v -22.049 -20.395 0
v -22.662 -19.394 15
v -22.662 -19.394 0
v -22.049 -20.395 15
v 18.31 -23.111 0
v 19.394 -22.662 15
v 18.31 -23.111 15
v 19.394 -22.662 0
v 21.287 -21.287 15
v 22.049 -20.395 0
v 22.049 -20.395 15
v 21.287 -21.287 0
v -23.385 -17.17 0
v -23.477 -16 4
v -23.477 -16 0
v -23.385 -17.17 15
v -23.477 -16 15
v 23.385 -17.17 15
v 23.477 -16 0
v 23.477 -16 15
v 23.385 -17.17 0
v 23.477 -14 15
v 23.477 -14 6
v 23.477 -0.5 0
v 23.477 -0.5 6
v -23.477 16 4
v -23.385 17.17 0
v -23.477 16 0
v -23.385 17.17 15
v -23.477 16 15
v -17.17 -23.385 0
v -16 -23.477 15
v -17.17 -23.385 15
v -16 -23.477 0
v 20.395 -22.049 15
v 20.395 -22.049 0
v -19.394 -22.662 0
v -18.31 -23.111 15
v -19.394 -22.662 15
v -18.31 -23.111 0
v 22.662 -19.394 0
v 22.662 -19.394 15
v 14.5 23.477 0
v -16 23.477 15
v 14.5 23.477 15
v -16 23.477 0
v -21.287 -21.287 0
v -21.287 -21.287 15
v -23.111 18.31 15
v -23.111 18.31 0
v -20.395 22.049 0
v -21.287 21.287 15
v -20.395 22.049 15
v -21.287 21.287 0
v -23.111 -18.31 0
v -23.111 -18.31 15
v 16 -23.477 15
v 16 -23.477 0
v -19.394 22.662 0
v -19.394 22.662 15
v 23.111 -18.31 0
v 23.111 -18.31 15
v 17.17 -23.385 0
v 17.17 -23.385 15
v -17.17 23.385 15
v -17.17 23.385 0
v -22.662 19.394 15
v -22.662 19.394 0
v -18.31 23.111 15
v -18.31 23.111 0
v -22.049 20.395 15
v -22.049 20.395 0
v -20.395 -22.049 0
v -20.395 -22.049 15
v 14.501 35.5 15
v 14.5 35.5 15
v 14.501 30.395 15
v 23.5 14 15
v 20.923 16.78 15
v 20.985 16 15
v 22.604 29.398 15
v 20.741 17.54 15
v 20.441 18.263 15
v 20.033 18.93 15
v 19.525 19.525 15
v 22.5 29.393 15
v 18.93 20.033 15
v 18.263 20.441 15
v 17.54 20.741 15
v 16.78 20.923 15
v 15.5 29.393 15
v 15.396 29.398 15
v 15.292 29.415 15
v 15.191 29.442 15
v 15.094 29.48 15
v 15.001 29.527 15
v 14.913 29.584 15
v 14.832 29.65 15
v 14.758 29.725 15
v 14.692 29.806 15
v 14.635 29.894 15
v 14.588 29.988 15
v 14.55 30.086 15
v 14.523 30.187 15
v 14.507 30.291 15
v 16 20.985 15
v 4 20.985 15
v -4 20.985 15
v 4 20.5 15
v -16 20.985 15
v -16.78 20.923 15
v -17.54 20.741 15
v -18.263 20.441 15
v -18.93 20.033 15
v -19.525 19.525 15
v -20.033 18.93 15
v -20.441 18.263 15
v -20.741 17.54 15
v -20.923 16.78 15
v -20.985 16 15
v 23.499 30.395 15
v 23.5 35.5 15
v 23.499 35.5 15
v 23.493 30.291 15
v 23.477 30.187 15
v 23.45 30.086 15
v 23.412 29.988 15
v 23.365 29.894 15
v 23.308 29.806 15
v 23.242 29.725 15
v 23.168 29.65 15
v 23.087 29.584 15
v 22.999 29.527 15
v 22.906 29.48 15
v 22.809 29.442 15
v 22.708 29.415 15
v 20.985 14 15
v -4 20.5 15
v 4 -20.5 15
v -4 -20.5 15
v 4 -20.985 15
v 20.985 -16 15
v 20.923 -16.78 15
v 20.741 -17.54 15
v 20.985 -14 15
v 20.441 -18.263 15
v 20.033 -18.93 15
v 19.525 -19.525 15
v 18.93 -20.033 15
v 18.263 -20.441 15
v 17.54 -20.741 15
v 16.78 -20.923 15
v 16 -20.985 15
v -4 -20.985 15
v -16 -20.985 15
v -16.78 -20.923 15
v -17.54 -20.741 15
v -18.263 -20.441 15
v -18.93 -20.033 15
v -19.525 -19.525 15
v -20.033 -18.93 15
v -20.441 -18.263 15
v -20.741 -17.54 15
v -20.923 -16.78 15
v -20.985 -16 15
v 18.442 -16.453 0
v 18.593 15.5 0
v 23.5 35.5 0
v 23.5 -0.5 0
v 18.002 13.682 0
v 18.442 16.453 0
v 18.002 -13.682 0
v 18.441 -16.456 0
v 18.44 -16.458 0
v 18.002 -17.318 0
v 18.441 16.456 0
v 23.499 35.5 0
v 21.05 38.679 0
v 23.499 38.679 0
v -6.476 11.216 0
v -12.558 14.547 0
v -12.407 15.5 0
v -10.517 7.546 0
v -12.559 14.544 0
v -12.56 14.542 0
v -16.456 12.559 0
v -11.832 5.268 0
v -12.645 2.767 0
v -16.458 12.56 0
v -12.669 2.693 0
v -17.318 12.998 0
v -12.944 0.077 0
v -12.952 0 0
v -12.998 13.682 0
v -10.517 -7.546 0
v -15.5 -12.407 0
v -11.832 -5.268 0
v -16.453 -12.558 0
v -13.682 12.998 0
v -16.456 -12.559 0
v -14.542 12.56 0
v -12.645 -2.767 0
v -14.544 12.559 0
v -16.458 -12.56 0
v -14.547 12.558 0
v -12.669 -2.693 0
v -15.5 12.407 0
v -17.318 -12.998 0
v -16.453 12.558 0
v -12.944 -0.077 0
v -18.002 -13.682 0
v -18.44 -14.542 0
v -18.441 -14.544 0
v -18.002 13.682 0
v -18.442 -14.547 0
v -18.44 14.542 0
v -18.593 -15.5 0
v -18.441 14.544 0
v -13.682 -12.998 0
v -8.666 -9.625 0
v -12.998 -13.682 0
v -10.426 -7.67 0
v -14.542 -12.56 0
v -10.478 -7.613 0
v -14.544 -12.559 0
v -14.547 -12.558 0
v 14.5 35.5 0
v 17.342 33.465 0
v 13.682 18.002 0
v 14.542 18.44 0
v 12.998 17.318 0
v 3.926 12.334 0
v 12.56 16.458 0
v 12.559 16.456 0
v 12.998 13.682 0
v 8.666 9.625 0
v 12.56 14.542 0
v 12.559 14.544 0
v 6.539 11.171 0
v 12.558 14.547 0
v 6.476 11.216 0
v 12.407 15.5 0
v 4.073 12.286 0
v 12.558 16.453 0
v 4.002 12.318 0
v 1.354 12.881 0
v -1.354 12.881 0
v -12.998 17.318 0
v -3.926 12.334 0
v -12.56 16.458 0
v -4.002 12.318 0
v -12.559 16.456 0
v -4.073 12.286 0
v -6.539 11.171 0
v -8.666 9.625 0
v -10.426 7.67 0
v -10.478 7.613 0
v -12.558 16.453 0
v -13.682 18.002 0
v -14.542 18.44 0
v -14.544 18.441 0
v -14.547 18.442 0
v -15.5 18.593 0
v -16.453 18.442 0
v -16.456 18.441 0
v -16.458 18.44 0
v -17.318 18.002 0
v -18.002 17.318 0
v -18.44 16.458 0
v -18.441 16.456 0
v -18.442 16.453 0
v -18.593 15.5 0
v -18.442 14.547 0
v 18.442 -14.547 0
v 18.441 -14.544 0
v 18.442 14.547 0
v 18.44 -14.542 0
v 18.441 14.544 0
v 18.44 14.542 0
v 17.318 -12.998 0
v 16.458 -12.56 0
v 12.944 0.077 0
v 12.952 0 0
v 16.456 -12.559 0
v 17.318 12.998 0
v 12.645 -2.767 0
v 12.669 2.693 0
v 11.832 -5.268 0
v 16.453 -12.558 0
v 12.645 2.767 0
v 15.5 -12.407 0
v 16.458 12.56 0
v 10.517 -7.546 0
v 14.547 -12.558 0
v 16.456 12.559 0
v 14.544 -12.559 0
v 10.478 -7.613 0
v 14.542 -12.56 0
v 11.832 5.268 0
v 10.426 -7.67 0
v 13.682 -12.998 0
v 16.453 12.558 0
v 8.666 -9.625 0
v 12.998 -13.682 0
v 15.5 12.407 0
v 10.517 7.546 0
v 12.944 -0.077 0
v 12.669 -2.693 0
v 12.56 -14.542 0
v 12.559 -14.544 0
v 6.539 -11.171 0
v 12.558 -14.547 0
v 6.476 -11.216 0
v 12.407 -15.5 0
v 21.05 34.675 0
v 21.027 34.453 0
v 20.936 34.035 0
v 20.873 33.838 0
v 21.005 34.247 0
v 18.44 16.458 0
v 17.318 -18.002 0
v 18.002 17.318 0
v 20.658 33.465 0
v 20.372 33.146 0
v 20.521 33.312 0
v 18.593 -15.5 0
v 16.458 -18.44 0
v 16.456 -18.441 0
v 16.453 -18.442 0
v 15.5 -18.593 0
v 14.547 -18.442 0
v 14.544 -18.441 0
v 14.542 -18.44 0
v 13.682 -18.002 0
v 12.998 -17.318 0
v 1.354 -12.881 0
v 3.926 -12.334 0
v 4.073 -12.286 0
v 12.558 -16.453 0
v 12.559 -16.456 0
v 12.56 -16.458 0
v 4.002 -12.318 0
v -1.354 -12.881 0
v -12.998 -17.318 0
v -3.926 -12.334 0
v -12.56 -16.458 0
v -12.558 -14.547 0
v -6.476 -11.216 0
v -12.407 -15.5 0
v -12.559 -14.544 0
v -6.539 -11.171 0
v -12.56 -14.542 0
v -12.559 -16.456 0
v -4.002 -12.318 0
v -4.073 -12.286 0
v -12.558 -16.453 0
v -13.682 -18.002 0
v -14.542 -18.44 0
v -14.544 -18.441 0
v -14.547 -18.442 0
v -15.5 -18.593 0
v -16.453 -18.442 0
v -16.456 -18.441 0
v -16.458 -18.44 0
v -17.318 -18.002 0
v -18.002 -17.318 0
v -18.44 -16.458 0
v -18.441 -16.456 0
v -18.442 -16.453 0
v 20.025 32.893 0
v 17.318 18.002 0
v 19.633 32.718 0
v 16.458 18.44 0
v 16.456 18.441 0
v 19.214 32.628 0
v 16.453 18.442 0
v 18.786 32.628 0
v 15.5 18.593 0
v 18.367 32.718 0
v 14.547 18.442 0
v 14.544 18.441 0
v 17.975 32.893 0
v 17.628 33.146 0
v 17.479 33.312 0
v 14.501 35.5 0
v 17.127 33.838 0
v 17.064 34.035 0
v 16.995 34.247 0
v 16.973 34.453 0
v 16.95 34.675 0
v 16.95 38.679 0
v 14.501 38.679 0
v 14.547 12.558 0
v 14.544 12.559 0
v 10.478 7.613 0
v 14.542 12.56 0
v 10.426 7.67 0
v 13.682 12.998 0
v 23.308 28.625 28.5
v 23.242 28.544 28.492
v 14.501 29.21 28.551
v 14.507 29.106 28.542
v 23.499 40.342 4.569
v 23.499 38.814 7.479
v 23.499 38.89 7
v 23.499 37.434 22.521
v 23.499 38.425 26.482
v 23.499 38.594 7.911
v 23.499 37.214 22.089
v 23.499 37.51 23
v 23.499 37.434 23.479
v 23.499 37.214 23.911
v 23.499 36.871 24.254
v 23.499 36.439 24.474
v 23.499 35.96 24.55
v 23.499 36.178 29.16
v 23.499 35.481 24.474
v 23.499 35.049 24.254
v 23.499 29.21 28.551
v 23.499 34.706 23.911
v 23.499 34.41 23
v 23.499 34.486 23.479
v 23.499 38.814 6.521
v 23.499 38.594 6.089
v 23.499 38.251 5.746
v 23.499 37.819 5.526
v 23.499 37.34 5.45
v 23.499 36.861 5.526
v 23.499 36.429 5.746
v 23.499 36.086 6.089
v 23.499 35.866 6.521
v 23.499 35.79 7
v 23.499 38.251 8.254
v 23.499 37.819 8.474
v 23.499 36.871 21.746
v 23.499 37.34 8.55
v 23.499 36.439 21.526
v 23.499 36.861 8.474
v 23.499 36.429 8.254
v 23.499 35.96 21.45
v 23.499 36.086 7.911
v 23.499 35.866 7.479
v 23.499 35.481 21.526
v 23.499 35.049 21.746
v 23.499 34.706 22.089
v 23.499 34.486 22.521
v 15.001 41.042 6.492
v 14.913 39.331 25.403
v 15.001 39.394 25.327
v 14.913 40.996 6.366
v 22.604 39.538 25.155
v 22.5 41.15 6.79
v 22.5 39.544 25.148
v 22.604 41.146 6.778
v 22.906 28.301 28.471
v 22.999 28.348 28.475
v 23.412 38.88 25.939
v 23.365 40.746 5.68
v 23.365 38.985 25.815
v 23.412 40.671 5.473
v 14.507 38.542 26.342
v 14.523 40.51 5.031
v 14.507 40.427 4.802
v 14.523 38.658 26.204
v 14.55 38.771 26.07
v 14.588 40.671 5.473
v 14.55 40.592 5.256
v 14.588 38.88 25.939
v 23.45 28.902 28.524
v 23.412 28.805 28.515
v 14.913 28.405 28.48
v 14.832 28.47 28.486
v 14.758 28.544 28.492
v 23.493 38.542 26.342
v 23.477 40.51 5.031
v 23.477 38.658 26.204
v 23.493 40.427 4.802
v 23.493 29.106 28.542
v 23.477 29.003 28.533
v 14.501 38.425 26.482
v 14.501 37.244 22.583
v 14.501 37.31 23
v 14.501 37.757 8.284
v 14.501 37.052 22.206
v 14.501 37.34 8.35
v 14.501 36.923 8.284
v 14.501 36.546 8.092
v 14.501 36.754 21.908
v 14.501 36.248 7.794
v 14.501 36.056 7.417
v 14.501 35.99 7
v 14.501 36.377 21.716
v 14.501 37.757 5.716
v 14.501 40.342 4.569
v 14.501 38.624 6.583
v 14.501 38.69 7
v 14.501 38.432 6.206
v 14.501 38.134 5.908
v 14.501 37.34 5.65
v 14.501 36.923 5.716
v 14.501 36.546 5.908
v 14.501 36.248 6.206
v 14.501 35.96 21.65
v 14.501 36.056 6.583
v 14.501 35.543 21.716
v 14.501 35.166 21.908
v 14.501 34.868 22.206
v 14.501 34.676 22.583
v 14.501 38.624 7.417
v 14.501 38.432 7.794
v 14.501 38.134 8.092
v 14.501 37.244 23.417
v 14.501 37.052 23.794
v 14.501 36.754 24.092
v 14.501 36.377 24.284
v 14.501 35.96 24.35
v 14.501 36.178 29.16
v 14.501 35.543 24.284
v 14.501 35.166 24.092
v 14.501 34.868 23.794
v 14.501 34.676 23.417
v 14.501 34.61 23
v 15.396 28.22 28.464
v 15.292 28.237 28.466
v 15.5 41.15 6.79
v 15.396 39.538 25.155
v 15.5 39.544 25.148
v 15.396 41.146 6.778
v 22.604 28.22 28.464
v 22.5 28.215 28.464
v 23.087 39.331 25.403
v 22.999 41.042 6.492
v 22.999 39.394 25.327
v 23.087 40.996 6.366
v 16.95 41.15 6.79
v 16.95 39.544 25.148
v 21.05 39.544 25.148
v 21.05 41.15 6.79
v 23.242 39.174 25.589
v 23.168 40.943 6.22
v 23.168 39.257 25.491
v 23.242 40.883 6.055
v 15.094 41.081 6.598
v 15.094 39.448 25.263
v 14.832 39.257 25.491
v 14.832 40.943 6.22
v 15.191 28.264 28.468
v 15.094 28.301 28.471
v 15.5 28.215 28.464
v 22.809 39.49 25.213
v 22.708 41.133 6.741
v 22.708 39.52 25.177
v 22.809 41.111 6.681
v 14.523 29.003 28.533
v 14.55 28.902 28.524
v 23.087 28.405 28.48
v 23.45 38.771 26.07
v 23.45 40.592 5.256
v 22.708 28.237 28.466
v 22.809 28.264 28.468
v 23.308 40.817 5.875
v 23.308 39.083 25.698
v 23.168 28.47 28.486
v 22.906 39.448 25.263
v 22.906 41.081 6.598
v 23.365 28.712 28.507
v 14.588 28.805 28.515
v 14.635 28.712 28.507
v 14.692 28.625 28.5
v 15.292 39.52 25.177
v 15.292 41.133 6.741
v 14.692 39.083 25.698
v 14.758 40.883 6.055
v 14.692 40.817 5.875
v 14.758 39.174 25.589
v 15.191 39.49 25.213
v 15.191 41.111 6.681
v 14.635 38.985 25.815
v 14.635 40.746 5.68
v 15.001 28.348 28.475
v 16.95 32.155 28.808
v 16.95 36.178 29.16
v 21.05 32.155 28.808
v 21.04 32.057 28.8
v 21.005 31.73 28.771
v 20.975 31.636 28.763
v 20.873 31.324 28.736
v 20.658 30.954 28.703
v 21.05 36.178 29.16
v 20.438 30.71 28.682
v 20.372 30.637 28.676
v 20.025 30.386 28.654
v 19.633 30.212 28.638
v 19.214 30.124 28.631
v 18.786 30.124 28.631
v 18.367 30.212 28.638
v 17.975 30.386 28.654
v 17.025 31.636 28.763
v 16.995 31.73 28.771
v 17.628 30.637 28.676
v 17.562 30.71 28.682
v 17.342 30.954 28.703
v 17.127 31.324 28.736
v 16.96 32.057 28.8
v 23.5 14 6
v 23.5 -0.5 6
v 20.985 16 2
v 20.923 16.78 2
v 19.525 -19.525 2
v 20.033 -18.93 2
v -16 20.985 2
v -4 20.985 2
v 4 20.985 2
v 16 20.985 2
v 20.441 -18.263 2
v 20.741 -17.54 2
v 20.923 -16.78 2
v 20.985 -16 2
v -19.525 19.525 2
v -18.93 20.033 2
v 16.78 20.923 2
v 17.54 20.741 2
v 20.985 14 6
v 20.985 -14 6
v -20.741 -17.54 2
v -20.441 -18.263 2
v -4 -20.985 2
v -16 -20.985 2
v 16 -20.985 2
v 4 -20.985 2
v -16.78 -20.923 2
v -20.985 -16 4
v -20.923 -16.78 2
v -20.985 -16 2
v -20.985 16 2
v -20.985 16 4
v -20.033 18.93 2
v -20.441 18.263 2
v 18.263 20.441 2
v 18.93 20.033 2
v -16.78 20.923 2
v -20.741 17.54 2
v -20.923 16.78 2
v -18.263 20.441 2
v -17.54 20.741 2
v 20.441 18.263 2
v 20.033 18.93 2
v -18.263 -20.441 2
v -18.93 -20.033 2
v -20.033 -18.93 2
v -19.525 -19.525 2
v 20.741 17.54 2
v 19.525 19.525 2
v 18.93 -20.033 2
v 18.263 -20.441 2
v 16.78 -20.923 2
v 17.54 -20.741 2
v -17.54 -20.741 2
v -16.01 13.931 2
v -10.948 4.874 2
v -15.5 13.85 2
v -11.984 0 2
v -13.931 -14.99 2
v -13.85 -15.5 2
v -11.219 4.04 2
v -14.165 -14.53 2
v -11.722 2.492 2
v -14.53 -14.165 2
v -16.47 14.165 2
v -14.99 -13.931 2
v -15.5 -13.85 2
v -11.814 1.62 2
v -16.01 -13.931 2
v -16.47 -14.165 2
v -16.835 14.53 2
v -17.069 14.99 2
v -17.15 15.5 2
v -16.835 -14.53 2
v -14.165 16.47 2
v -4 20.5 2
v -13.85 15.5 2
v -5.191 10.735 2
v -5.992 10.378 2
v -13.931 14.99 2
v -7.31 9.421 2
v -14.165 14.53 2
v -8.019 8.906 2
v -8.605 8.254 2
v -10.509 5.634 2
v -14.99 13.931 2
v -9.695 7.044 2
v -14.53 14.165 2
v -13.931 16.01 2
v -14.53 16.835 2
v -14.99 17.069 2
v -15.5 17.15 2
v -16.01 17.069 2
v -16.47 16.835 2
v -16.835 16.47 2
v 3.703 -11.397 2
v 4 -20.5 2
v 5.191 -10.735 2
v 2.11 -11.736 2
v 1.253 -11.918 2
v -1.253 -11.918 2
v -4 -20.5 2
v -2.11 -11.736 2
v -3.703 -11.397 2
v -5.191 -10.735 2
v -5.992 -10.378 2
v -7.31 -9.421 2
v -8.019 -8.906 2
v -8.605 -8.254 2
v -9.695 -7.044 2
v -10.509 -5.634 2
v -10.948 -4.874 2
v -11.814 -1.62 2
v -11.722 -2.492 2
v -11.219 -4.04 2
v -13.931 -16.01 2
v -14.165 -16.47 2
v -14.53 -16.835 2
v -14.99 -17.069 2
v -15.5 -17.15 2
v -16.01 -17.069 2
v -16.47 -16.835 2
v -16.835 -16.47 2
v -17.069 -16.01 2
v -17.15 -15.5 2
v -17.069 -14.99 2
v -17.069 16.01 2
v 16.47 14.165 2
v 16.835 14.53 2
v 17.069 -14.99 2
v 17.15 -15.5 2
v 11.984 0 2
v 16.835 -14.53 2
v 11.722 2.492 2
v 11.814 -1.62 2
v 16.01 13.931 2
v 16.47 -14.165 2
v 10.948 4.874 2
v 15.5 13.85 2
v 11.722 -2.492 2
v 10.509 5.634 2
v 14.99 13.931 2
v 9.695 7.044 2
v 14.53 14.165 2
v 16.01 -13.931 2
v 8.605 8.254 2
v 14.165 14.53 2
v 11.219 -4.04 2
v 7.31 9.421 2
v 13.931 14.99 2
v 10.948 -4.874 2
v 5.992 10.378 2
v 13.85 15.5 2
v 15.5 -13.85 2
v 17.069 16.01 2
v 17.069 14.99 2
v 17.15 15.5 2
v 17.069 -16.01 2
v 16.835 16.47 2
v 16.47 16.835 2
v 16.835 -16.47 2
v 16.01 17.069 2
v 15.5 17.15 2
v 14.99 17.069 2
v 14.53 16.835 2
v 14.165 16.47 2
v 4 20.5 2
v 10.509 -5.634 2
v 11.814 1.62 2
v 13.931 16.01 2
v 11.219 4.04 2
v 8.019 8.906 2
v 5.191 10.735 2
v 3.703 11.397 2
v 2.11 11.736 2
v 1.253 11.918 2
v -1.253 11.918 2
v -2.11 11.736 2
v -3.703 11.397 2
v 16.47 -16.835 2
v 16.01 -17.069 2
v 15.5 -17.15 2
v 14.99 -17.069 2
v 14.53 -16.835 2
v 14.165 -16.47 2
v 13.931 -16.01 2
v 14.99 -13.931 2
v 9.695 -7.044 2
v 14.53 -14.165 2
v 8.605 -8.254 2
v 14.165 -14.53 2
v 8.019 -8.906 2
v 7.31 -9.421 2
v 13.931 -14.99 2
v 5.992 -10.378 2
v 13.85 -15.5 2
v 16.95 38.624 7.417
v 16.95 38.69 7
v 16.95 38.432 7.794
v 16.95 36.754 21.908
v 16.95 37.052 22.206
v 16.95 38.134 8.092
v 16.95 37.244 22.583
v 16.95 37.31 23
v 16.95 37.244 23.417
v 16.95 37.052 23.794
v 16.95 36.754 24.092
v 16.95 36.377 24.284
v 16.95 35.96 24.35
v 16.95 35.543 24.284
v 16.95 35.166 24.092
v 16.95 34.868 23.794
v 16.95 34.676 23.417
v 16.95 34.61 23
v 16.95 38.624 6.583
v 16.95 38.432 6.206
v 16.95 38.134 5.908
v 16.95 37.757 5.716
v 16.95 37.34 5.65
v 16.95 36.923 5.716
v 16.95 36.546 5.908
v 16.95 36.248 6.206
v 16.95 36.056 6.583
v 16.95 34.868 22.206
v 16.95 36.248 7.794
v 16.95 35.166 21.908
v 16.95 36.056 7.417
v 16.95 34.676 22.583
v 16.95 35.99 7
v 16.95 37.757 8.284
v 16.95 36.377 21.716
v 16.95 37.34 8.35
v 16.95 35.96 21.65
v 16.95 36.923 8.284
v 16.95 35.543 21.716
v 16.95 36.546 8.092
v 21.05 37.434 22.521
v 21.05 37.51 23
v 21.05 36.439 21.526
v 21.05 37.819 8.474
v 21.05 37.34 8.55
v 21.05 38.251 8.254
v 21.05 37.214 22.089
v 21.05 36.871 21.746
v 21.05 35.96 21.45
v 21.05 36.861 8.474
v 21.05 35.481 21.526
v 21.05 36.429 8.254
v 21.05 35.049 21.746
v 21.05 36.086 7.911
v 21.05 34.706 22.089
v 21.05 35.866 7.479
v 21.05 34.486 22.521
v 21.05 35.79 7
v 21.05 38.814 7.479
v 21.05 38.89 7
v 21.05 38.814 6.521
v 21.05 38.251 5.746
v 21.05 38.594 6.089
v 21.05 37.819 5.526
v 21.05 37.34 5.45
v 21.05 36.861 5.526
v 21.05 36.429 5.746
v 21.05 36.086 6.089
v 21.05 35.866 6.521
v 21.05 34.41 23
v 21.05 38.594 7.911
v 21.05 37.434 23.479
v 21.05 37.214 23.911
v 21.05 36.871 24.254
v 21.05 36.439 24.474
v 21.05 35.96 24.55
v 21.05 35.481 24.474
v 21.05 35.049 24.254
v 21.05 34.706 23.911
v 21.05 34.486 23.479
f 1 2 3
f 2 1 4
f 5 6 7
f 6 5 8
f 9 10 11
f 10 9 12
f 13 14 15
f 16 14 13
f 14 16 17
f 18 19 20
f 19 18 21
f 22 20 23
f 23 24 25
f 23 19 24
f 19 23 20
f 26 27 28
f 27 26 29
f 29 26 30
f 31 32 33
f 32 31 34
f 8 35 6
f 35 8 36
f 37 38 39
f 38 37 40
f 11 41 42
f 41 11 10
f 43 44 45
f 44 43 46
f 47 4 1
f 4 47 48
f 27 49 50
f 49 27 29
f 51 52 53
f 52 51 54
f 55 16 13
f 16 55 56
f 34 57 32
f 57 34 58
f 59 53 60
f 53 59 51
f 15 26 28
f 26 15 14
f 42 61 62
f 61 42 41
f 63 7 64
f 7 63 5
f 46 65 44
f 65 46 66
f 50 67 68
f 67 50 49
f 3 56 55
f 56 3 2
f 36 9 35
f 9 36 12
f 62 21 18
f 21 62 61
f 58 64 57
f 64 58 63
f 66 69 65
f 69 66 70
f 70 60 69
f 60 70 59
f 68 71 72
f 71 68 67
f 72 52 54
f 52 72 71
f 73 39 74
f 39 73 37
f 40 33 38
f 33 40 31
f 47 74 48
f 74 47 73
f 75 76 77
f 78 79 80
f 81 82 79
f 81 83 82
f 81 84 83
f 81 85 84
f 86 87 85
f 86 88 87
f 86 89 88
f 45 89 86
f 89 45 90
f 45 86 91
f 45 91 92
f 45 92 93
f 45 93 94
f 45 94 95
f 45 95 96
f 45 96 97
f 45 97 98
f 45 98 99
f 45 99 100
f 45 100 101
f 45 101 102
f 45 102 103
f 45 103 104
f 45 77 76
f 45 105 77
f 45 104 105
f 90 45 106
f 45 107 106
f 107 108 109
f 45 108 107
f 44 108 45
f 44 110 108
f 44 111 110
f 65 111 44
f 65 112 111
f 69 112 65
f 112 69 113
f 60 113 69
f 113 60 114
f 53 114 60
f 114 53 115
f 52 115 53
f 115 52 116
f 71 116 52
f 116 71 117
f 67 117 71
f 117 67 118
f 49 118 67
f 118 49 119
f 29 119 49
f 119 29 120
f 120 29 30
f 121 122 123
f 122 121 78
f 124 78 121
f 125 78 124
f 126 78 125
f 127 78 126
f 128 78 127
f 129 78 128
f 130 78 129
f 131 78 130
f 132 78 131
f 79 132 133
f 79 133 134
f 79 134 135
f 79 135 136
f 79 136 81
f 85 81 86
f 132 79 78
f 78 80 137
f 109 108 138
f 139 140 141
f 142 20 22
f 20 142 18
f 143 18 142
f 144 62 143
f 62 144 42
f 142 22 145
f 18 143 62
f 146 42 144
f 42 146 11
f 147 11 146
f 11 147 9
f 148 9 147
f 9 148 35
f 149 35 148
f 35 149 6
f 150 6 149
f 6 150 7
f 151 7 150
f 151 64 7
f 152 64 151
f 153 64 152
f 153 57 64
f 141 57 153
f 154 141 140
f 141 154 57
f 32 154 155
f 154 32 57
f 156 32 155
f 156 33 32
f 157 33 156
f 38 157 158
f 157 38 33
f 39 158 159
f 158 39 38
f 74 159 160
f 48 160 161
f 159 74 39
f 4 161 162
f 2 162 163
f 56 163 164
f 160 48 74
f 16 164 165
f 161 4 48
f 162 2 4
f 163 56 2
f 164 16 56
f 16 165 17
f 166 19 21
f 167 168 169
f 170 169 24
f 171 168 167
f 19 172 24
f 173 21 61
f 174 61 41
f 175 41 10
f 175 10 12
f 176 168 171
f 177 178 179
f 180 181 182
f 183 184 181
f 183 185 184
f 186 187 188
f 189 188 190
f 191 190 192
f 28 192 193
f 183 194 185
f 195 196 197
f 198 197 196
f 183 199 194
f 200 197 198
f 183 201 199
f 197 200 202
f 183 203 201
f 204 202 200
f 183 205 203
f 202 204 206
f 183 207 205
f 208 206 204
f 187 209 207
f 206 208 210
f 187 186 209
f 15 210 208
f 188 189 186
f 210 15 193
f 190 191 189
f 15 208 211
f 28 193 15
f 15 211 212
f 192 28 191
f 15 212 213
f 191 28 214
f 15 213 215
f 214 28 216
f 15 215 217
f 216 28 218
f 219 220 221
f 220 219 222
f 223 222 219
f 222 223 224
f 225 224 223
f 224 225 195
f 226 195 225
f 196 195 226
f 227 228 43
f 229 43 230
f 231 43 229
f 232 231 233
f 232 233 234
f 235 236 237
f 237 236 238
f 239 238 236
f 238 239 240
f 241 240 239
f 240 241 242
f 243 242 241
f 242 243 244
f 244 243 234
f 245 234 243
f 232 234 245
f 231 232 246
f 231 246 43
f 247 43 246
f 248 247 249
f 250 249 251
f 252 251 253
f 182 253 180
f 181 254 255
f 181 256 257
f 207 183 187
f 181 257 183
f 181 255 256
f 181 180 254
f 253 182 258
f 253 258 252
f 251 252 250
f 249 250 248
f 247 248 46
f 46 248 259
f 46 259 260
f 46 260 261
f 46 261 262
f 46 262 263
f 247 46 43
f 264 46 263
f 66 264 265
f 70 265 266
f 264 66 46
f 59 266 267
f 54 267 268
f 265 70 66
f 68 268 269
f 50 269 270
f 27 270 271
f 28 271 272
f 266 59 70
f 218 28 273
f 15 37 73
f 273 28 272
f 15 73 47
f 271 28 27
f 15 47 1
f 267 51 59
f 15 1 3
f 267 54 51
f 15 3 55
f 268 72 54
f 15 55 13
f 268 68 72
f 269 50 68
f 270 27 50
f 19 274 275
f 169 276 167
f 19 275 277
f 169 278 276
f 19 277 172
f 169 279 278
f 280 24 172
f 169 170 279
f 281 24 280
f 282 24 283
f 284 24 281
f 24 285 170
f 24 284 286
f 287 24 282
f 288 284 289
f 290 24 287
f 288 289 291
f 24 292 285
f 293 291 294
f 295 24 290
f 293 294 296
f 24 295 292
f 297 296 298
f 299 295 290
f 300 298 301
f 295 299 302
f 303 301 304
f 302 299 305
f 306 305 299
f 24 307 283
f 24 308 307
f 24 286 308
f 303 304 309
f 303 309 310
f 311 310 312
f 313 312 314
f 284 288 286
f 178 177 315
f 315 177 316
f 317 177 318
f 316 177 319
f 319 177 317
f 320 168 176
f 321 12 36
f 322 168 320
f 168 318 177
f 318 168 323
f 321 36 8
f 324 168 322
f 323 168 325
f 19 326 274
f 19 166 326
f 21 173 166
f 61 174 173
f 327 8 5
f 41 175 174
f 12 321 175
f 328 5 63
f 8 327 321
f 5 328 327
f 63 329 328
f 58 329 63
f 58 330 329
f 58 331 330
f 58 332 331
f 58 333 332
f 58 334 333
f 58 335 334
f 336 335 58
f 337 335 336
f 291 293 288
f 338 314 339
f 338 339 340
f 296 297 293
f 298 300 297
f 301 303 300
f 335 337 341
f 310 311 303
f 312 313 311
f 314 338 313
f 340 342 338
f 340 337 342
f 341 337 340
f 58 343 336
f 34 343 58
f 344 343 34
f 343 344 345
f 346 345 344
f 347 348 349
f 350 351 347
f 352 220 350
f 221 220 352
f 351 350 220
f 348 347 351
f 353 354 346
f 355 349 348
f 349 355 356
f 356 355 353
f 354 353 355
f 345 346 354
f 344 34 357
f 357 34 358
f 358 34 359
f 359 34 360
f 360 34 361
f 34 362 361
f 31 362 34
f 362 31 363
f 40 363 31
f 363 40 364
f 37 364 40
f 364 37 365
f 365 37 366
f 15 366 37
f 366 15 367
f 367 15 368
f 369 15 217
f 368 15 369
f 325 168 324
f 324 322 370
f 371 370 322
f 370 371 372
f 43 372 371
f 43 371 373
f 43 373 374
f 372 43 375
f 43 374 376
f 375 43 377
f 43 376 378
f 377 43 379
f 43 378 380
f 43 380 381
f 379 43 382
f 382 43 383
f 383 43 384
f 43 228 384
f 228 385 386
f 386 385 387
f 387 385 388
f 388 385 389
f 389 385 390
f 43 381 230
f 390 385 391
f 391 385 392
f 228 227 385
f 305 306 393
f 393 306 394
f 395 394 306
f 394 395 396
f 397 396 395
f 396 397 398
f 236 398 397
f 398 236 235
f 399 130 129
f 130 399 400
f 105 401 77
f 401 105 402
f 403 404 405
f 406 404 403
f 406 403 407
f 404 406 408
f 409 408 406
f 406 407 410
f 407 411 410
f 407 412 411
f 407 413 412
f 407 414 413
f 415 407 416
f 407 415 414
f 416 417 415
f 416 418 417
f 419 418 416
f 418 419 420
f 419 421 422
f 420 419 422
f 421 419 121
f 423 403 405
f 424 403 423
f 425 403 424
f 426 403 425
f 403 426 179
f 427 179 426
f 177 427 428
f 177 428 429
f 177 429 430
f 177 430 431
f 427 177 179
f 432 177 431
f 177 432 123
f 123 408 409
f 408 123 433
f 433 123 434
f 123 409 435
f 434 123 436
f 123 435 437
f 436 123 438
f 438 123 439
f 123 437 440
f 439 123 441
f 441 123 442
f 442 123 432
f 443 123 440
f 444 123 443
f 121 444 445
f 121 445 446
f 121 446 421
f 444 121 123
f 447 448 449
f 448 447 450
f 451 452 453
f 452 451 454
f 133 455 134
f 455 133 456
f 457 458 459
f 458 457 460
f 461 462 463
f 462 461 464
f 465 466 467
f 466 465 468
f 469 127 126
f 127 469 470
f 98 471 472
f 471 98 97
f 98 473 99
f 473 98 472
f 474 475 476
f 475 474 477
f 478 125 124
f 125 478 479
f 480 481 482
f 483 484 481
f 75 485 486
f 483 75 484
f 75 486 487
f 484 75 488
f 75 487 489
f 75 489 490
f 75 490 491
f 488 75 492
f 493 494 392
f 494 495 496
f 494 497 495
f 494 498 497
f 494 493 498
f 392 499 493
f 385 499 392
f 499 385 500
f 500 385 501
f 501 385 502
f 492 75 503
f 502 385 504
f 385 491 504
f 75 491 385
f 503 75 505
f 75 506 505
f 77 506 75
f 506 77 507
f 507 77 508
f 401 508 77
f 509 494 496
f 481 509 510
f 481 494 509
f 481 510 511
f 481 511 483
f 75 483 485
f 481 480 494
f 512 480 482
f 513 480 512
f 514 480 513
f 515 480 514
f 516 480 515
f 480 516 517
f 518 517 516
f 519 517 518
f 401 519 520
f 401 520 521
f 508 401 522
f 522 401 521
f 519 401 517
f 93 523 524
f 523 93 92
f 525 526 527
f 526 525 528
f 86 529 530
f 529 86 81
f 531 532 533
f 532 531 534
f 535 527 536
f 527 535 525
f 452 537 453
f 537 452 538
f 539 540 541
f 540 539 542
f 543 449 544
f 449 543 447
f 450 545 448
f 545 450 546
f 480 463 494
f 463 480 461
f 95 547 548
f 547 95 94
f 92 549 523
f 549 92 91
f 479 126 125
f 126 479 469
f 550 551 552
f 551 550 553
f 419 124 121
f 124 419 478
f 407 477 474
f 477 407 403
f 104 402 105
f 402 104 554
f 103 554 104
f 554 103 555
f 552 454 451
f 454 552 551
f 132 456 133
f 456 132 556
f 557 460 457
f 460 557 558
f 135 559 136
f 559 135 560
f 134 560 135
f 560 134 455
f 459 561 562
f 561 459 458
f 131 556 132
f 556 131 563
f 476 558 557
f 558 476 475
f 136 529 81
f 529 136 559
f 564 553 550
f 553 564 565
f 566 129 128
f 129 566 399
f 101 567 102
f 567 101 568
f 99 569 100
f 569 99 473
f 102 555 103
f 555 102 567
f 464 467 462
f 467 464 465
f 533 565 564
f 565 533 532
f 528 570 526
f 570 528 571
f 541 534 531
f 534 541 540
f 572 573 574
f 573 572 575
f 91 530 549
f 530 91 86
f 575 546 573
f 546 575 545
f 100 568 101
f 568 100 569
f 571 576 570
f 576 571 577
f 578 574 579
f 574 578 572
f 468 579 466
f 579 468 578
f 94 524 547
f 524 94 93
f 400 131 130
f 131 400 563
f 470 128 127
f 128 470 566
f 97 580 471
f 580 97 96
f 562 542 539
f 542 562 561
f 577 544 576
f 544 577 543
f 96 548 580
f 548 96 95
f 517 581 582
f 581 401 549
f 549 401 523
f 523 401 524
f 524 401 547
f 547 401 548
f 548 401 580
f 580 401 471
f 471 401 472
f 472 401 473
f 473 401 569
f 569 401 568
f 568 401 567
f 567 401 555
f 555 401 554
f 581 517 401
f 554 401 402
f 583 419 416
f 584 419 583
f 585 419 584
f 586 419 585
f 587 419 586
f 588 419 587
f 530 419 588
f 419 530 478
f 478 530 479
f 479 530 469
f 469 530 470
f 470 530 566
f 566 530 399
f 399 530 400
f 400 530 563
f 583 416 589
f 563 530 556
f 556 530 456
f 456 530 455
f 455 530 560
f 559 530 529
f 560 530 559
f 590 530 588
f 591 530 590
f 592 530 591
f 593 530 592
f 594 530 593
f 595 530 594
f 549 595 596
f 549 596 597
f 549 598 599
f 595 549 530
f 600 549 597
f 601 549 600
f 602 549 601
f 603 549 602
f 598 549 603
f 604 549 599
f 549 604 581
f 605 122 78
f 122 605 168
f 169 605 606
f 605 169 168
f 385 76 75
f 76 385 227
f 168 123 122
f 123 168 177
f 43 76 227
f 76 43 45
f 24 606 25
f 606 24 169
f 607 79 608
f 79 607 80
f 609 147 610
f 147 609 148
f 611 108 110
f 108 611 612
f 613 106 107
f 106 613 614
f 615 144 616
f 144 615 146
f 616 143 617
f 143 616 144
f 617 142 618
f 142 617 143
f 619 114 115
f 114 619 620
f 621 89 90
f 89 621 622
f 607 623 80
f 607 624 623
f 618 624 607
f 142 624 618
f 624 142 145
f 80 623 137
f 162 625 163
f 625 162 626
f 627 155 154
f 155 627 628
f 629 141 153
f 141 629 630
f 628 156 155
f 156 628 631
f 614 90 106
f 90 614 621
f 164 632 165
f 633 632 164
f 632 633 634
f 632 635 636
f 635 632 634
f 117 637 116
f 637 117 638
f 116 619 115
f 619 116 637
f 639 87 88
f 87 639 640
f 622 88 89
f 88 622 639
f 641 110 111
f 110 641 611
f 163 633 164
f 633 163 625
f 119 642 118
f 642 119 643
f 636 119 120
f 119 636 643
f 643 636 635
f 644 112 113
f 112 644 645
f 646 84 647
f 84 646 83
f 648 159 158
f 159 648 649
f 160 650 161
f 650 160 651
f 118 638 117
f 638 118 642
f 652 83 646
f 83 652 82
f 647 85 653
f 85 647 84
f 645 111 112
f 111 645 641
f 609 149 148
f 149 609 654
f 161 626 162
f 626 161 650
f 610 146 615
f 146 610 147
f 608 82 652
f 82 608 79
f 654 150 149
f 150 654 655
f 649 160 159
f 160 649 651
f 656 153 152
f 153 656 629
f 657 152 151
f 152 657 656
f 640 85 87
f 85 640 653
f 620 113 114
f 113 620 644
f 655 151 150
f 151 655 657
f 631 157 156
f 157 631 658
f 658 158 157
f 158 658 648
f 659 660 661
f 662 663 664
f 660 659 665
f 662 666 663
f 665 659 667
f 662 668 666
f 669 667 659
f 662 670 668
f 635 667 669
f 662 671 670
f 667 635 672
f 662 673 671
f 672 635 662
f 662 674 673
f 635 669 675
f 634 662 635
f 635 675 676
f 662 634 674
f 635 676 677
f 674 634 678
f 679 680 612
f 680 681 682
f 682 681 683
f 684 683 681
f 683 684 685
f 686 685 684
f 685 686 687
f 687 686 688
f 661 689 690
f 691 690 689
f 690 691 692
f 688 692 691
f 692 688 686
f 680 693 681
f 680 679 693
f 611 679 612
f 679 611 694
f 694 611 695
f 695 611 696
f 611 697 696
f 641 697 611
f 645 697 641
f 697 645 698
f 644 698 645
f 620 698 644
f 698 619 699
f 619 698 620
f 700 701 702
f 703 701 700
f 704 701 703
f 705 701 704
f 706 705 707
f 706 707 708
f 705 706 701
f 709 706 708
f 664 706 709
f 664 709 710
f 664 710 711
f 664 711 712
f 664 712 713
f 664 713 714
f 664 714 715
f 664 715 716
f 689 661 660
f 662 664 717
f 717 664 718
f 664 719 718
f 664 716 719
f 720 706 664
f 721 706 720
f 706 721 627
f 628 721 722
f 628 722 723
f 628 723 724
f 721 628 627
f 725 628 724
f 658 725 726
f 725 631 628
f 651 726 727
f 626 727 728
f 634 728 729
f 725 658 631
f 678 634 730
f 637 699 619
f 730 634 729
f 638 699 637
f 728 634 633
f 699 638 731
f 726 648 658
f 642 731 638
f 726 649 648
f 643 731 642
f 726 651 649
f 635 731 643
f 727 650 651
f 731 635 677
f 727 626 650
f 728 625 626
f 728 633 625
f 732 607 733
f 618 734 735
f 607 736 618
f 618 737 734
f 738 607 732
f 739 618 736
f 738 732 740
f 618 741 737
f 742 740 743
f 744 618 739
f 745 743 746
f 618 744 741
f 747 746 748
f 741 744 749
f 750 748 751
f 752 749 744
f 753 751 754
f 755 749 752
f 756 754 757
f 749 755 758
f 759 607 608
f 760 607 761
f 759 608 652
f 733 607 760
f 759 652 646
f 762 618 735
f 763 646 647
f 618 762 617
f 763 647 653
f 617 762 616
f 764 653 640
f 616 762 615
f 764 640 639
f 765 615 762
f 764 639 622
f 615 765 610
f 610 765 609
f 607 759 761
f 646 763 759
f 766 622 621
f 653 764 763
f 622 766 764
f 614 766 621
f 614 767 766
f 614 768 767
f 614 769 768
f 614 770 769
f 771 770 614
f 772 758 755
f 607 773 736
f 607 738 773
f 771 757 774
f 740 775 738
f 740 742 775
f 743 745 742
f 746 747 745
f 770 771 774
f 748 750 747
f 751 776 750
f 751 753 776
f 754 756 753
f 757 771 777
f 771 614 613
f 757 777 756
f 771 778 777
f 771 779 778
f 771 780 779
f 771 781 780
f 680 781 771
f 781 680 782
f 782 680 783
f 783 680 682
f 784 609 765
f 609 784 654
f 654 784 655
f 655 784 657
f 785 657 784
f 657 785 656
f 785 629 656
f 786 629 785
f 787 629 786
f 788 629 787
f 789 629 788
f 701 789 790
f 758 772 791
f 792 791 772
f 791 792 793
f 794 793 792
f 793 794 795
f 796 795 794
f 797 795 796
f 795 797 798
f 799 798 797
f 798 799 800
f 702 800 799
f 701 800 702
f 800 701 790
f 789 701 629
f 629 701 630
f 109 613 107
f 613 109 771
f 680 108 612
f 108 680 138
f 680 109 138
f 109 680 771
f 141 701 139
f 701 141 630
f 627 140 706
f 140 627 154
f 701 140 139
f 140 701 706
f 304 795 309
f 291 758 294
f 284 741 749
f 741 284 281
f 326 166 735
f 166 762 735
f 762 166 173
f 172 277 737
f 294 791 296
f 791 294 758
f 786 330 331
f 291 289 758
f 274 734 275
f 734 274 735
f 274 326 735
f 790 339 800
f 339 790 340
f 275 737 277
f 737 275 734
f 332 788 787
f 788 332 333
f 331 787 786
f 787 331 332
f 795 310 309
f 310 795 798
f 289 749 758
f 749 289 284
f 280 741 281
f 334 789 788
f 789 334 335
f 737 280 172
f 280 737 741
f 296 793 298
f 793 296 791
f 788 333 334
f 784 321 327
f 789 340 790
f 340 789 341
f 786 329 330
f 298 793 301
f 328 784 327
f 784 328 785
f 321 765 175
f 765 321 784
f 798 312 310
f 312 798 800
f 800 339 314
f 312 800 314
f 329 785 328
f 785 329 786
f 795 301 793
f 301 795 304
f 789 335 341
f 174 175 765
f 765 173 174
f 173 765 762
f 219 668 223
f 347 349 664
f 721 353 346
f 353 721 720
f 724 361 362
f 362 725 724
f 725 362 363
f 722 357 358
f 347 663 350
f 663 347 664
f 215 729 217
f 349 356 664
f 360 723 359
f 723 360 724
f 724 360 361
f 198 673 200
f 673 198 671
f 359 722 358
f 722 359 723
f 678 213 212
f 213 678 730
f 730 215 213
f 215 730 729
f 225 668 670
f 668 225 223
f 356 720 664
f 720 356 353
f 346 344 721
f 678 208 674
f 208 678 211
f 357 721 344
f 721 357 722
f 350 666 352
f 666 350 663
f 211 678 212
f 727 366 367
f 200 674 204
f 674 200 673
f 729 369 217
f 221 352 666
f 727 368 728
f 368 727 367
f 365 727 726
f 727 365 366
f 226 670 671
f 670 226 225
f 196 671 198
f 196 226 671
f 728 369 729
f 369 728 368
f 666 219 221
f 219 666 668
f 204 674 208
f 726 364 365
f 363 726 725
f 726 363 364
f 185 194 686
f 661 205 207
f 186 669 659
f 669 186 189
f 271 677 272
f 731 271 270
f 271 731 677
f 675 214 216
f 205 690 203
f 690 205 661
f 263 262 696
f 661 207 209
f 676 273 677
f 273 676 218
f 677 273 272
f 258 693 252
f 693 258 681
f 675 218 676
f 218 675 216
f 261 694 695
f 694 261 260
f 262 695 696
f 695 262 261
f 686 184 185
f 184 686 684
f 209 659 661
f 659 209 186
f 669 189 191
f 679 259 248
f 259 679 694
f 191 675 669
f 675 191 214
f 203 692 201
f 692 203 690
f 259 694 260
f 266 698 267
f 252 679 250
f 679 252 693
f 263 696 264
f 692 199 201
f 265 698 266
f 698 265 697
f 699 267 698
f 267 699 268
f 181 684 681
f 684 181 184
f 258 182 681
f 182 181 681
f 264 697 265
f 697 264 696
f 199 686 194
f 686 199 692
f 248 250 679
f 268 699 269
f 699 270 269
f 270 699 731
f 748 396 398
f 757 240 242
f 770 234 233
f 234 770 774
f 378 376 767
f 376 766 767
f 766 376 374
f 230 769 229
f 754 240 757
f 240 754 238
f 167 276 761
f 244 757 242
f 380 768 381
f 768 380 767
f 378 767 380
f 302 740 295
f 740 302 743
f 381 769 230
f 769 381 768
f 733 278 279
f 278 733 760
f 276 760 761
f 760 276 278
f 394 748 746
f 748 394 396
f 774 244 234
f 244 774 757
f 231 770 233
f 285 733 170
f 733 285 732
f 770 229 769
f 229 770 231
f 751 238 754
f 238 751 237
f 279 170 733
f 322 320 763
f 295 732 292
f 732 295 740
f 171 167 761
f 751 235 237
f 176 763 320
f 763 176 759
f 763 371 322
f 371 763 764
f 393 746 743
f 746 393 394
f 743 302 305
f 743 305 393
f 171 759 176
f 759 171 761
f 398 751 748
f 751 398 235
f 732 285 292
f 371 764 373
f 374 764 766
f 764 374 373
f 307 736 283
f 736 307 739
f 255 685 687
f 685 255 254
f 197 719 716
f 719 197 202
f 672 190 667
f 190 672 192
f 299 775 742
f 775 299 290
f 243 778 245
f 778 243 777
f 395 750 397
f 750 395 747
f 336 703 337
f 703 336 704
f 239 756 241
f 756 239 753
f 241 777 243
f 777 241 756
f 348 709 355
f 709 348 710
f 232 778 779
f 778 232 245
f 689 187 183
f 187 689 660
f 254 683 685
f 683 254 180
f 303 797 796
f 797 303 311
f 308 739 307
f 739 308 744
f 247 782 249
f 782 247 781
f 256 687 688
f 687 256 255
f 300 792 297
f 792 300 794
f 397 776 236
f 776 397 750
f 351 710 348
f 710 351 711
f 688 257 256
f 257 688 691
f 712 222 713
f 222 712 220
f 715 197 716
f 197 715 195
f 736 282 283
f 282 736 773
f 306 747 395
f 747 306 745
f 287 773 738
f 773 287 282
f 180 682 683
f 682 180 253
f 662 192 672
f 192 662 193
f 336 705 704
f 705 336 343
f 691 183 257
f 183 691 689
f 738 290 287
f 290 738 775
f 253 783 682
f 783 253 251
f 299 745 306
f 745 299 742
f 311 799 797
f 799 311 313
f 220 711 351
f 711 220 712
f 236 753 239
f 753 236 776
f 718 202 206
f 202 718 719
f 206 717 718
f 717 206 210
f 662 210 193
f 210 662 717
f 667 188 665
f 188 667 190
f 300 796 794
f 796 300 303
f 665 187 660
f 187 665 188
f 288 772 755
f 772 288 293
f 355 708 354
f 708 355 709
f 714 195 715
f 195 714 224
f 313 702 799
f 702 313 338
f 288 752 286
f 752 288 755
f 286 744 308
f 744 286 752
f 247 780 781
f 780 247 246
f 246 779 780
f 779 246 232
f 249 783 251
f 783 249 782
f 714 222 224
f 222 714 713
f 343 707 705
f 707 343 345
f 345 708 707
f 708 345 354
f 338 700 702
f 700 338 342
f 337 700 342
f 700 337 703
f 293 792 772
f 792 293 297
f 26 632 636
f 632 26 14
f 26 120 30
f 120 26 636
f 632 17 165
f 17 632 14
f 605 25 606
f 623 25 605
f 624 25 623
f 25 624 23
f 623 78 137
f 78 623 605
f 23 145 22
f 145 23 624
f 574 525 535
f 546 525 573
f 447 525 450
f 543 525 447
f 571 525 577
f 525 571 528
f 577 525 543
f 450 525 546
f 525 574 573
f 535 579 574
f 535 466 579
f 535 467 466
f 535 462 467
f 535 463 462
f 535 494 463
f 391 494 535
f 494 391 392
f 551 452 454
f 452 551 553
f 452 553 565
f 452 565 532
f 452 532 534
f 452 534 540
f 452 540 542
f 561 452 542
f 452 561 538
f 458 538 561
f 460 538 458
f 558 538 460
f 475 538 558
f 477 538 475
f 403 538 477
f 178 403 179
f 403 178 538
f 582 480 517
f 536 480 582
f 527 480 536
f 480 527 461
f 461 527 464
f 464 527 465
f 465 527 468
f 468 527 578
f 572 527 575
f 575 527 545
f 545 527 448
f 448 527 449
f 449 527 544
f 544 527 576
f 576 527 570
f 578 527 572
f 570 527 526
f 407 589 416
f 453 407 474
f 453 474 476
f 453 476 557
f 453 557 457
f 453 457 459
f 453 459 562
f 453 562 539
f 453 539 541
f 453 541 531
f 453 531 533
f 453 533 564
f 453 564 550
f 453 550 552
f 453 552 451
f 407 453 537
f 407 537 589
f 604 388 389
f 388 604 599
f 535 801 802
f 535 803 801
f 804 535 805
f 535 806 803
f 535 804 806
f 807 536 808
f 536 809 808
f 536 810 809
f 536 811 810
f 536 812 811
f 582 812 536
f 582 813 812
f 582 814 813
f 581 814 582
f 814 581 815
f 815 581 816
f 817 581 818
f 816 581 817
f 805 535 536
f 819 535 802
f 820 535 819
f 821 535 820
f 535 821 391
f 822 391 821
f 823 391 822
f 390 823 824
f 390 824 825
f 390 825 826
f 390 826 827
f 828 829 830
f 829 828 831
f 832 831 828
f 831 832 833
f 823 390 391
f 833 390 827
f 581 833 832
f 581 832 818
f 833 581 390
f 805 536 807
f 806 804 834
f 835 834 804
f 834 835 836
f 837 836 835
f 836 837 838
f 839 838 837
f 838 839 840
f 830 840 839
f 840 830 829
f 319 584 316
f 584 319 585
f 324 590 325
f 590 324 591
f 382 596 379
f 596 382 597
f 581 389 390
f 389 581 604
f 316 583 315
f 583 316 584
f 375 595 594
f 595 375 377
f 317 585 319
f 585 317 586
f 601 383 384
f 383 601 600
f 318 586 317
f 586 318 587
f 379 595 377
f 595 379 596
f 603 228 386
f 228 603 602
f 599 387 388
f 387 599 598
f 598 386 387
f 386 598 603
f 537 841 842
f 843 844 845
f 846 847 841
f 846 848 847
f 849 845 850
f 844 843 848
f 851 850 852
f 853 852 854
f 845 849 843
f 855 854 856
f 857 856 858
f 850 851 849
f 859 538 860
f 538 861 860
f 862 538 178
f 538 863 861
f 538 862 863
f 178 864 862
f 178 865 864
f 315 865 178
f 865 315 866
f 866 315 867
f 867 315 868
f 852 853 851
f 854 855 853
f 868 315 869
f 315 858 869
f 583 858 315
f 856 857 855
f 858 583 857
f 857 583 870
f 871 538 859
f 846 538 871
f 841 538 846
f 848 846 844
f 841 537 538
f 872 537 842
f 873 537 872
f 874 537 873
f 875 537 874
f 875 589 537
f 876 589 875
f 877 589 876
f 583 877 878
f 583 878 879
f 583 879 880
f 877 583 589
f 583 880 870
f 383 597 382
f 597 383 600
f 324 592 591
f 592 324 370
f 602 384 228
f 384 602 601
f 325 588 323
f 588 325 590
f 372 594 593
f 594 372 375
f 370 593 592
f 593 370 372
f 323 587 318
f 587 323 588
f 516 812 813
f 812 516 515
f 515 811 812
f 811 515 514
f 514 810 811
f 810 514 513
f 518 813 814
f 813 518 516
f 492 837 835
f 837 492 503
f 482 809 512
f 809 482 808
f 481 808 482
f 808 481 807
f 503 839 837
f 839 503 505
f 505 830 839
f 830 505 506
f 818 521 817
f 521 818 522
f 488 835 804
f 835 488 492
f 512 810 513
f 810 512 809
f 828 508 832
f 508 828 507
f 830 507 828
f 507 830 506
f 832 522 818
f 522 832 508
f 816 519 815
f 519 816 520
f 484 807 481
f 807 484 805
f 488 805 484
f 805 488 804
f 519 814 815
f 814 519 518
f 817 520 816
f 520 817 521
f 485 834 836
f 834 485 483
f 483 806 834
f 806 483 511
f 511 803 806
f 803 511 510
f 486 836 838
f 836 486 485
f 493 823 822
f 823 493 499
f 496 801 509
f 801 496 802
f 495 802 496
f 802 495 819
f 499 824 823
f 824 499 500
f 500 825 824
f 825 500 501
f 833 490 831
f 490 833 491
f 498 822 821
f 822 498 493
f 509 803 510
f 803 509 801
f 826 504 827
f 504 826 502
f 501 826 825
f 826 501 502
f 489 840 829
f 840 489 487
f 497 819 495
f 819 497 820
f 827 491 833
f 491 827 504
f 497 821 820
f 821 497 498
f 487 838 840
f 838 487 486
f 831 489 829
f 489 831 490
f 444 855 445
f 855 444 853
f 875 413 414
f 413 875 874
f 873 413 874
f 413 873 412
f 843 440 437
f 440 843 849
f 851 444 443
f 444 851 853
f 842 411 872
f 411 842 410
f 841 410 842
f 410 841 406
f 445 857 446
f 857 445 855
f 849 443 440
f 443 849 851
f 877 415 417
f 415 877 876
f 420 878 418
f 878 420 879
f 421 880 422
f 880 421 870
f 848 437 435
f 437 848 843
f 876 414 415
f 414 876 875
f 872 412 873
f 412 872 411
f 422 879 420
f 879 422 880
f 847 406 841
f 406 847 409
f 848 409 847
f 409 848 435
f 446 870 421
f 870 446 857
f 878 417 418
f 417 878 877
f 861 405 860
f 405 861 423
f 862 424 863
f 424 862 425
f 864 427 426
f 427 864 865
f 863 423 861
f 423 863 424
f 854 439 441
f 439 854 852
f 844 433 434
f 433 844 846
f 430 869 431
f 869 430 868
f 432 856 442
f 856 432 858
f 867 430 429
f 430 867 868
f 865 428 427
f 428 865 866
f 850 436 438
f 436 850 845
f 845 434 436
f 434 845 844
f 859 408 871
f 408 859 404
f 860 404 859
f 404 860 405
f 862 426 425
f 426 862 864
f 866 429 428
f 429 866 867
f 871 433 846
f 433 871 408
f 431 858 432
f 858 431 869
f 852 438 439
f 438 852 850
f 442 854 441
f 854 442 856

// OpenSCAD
// file: ../../Dollo/NEW_long_ties/globals.scad
/*
Most things in this file is represented as one millimeter, so keep that in mind while changing things.
Some of the setting are not mm but at variables that you can set, such as 2*x=2x and you are setting what x is.
I will try to specify when things are variables and not exact measurements.
*/

// printer slop
slop = 0.15;

obj_leg = 30;
leg_length = 5.5;
small_number = 0.001;
metal_core_rode_global = 5;


///////////////// number of holes /////////////////////
z_hole_number = 8;
other_holes = 8;

///////////////// Pins /////////////////////

//pins that poke out
ball_size = 10;
pin_height = 20;
pin_diameter = 6;


//holes
hole_ball_size = ball_size;
hole_pin_height = pin_height;
hole_pin_diameter = pin_diameter;

///////////////// Z THINGS /////////////////////

berring_slot_width = 7.5;
berring_slot_depth = 6.5;
metal_core_rode = 5;

///////////////// X THINGS /////////////////////

//male dove tails
male_dove_max_width=8;
male_dove_min_width=5;
male_dove_depth=5;
male_dove_height=obj_leg/2;

function scaled_male_dove_max_width() = male_dove_max_width;
function scaled_male_dove_min_width() = male_dove_min_width - 0.5*slop;
function scaled_male_dove_depth() = male_dove_depth - .2;

//female dove tails, this is found on the y mounts
girl_max_width=11;
girl_min_width=5;
girl_depth=5;
girl_height=obj_leg;


///////////////// Y THINGS /////////////////////
/*
The Y is so normal that all of those global variables at the top should change all of the setting in it, this section is set her incase there are variables set in the future development of this project.
*/

// stepper
motor_side_length = 42.3;
motor_height = 40;
motor_bolt_hole_distance = 31;
motor_center_hole = 23;
motor_shaft_dia = 5;
motor_shaft_hole_dia = 5;

// bolts etc.
bolt_hole_dia = 3 + 2*slop;
bolt_head_hole_dia = 6.2;

m4_bolt_hole_dia = 4 + 2*slop;
m4_bolt_head_hole_dia = 6.8 + 2*slop;

m3_nut_side = 5.65;
m3_nut_height = 2.3;
m4_nut_side = 6.85;
m4_nut_height = 3.1;

// threaded rod
lifter_rod_diam = 9.86;
hole_threaded_rod = lifter_rod_diam + 2*slop;

// for the extensions
// metal_rod_size = 9;
metal_rod_size = 8.3; // metric

// z screw
z_screw_d = 25;

// stabilizer
pin_bolt_dia = 12 - 2*slop;
pin_bolt_dia_minus = 12 + 2*slop;

clip_bolt_dia = 10 - 2*slop;
clip_bolt_dia_minus = 10 + 2*slop;

// rack
rack_teeth_angle = 30;
rack_h = 12;
rack_tooth = 5;
// main file
use <../../Dollo/NEW_long_ties/include.scad>;


CR10_ptfe_x_mount();


module CR10_ptfe_x_mount() {
    difference() {
        union() {
            translate([0, 0, 15/2])
            rounded_cube_side(
                47, 47, 15, 15, center=true, $fn=40
            );
            translate([47/2 - 9/2, 35, 30/2 - 1])
            rotate([5, 0, 0])
            rounded_cube_side(
                9, 11, 30, 2, center=true, $fn=60
            );

            hull() {
                translate([47/2 - 9/2, 35, 15/2])
                cube([9, 1, 15], center=true);

                translate([47/2 - 9/2, 0, 15/2])
                cube([9, 1, 15], center=true);
            }
        }

        translate([0, 0, -10])
        cylinder(d=100, h=10);

        translate([-20, 0, 20/2 + 4])
        cube([30, 32, 20], center=true);

        translate([20, 0, 20/2 + 6])
        cube([30, 28, 20], center=true);

        translate([0, 44, 0])
        rotate([-20, 0, 0])
        cube([60, 10, 20], center=true);

        translate([0, 42, 30])
        rotate([40, 0, 0])
        cube([60, 10, 20], center=true);


        difference() {
            translate([0, 0, 15/2 + 2])
            rounded_cube_side(
                42, 42, 15, 10, center=true, $fn=40
            );

            translate([0, 42/2, 0])
            cube([8, 1, 40], center=true);

            translate([0, -42/2, 0])
            cube([8, 1, 40], center=true);
        }

        hull() {
            translate([47/2 - 9/2, 34.5, 2])
            rotate([5, 0, 0])
            cylinder(d=4.1, h=100, center=true, $fn=30);

            translate([47/2 - 9/2, 44.5, 2])
            rotate([5, 0, 0])
            cylinder(d=4.1, h=100, center=true, $fn=30);
        }

        translate([16, 35.96, 23])
        rotate([0, 90, 0])
        cylinder(d=2.7, h=5, center=true, $fn=20);

        translate([16, 37.34, 7])
        rotate([0, 90, 0])
        cylinder(d=2.7, h=5, center=true, $fn=20);

        translate([22, 35.96, 23])
        rotate([0, 90, 0])
        cylinder(d=3.1, h=5, center=true, $fn=20);

        translate([22, 37.34, 7])
        rotate([0, 90, 0])
        cylinder(d=3.1, h=5, center=true, $fn=20);

        translate([0, 0, 5])
        rotate([180, 0, 0])
        motor_plate_holes(
            h=5, bolt_head_cones=true,
            center_chamfer=true
        );
    }

    %translate([47/2 - 9/2, 34.5, 2])
    rotate([5, 0, 0])
    cylinder(d=4, h=100, center=true, $fn=30);
}
